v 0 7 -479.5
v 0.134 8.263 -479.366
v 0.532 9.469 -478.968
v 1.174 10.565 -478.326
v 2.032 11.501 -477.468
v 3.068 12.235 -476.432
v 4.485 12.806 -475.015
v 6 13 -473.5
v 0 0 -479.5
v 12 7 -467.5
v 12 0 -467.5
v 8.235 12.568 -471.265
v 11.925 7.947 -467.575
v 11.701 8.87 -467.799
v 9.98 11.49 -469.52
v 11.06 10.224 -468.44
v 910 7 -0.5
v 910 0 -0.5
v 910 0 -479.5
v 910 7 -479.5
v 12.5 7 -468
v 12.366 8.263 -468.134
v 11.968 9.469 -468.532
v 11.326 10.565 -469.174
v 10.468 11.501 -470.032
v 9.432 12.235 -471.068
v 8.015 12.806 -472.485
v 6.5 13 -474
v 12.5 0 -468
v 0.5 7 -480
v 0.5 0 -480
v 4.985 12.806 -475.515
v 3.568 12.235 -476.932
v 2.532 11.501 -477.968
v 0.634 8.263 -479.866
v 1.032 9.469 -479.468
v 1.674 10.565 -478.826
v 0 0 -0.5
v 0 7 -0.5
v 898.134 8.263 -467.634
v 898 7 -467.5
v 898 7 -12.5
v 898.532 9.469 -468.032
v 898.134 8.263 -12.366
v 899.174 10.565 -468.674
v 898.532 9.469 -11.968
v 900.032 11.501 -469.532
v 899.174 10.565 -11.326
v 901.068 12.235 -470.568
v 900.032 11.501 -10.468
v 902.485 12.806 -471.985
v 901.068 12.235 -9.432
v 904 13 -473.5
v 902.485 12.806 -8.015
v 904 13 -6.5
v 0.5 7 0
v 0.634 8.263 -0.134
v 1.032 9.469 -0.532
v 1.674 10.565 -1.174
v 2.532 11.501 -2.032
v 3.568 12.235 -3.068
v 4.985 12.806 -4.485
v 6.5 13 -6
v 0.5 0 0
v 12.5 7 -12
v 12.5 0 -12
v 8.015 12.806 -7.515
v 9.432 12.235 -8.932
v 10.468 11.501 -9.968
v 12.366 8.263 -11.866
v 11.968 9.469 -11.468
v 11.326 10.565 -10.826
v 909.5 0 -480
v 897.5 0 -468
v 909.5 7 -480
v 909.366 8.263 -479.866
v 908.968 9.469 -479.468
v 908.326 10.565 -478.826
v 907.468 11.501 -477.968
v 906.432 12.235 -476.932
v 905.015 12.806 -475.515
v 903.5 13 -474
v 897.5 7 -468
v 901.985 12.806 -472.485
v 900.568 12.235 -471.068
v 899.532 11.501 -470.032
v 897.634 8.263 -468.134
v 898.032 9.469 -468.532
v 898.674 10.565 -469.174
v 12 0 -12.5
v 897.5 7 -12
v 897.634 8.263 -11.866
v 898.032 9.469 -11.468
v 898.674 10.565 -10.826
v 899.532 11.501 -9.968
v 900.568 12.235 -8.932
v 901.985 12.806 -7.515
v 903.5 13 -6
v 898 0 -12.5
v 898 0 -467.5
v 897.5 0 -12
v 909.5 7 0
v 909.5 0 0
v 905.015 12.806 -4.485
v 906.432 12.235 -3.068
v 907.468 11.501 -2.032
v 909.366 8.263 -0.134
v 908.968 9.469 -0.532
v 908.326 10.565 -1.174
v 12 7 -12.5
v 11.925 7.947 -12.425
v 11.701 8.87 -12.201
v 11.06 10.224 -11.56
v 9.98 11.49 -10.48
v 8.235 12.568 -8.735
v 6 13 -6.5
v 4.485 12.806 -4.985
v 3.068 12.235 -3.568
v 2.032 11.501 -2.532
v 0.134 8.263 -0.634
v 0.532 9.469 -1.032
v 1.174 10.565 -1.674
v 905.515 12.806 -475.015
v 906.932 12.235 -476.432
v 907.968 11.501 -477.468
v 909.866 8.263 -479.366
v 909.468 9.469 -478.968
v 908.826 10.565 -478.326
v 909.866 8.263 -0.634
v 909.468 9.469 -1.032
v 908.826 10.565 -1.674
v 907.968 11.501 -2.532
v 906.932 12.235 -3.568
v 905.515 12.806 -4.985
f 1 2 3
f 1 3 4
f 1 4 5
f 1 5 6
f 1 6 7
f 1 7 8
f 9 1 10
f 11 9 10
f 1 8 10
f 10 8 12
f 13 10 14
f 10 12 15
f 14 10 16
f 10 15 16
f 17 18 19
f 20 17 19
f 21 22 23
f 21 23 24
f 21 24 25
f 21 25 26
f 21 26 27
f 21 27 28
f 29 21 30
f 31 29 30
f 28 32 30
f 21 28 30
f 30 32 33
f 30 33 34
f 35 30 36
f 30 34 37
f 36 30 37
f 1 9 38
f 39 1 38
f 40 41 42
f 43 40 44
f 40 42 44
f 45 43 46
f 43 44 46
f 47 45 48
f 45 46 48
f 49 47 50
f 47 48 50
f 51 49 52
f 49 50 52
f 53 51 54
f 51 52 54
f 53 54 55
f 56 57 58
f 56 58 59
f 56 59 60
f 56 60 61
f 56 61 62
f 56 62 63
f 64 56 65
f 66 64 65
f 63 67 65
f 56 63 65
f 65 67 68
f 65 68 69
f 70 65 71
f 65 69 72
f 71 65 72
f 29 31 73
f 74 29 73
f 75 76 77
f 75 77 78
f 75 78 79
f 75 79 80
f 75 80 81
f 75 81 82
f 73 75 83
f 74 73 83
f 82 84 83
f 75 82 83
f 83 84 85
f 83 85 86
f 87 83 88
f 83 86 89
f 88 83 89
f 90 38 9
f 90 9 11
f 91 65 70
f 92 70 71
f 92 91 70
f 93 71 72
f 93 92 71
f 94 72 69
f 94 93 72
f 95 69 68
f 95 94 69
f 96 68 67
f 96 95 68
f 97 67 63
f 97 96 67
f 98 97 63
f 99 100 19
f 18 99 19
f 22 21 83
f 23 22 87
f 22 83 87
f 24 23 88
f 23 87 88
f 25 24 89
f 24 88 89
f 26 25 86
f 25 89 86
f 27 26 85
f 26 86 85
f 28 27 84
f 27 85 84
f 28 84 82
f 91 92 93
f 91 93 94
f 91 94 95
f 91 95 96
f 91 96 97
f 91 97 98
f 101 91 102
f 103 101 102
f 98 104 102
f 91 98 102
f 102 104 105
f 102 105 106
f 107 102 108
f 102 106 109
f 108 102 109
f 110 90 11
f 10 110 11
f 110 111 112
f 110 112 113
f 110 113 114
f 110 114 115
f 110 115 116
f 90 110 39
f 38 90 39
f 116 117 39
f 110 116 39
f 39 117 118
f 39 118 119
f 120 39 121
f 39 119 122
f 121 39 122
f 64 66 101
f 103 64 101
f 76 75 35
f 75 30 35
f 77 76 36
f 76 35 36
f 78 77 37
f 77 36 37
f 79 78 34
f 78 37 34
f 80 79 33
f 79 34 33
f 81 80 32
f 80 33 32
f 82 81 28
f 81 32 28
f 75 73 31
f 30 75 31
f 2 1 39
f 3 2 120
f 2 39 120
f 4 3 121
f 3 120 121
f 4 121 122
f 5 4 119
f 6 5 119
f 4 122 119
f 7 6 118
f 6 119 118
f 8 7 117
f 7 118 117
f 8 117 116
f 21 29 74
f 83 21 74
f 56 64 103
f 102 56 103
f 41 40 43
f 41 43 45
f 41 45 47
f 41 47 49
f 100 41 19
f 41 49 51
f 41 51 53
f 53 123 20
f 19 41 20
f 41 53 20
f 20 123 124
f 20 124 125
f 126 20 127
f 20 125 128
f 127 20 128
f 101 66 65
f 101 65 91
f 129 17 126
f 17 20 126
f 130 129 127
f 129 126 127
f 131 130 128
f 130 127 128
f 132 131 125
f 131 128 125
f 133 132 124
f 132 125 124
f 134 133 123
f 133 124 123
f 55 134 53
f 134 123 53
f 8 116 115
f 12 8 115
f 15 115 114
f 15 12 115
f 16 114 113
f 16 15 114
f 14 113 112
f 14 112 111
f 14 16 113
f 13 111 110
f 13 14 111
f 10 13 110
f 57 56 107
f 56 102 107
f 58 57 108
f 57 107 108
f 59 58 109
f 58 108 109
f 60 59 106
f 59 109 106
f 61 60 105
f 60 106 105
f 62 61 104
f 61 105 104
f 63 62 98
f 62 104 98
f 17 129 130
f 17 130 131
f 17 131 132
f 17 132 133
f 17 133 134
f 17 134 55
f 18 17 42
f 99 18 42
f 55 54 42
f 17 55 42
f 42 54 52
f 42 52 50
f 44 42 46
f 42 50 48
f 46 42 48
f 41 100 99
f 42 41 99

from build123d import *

# Parameters (mm, degrees)
CROQUIS1_W              = 910
CROQUIS1_H              = 12
SALIENTE_EXTRUIR1_DEPTH = 13
CORTAR_EXTRUIR1_DEPTH   = 40
REDONDEO6_R             = 6
REDONDEO7_R             = 6
REDONDEO8_R             = 6
REDONDEO9_R             = 6


with BuildPart() as part:
    # Croquis1 → Saliente-Extruir1 (new body)
    with BuildSketch(Plane(origin=(0, 0, 0), x_dir=(1, 0, 0), z_dir=(0, 1, 0))):
        Polygon((0, 480), (0, 12), (12, 12), (12, 468), (898, 468), (898, 12), (910, 12), (910, 480), align=None)
        with Locations((455, 6)):
            Rectangle(CROQUIS1_W, CROQUIS1_H)
    extrude(amount=SALIENTE_EXTRUIR1_DEPTH)

    # Croquis2 → Cortar-Extruir1 (cut)
    with BuildSketch(Plane(origin=(0, 13, 0), x_dir=(1, 0, 0), z_dir=(0, 1, 0))):
        Polygon((12, 467.5), (12, 468), (0, 480), (0, 479.5), align=None)
        Polygon((0, 480), (12, 468), (12.5, 468), (0.5, 480), align=None)
        Polygon((12, 12), (12, 12.5), (0, 0.5), (0, 0), align=None)
        Polygon((12.5, 12), (12, 12), (0, 0), (0.5, 0), align=None)
        Polygon((910, 480), (898, 468), (898, 467.5), (910, 479.5), align=None)
        Polygon((909.5, 480), (897.5, 468), (898, 468), (910, 480), align=None)
        Polygon((910, 0.5), (898, 12.5), (898, 12), (910, 0), align=None)
        Polygon((898, 12), (897.5, 12), (909.5, 0), (910, 0), align=None)
    extrude(amount=-CORTAR_EXTRUIR1_DEPTH, mode=Mode.SUBTRACT)


with BuildPart() as cortar_extruir1_piece_1:
    # of the separate pieces the step leaves, piece 1, a body of its own (cortar_extruir1_pieces)
    add(part.part.solids().sort_by_distance((909.5, 0, -480))[0])

    # Redondeo6
    redondeo6_edges = [cortar_extruir1_piece_1.edges().sort_by_distance(p)[0] for p in [
        (455, 13, -480),
        (455, 13, -468),
    ]]
    fillet(redondeo6_edges, radius=REDONDEO6_R - 0.0001)  # a hair under: the kernel refuses the full size


with BuildPart() as cortar_extruir1_piece_2:
    # of the separate pieces the step leaves, piece 2, a body of its own (cortar_extruir1_pieces)
    add(part.part.solids().sort_by_distance((0.5, 0, 0))[0])

    # Redondeo8
    redondeo8_edges = [cortar_extruir1_piece_2.edges().sort_by_distance(p)[0] for p in [
        (455, 13, 0),
        (455, 13, -12),
    ]]
    fillet(redondeo8_edges, radius=REDONDEO8_R - 0.0001)  # a hair under: the kernel refuses the full size


with BuildPart() as cortar_extruir1_piece_3:
    # of the separate pieces the step leaves, piece 3, a body of its own (cortar_extruir1_pieces)
    add(part.part.solids().sort_by_distance((0, 0, -479.5))[0])

    # Redondeo7
    redondeo7_edges = [cortar_extruir1_piece_3.edges().sort_by_distance(p)[0] for p in [
        (0, 13, -240),
        (12, 13, -240),
    ]]
    fillet(redondeo7_edges, radius=REDONDEO7_R - 0.0001)  # a hair under: the kernel refuses the full size


with BuildPart() as cortar_extruir1_piece_4:
    # of the separate pieces the step leaves, piece 4, a body of its own (cortar_extruir1_pieces)
    add(part.part.solids().sort_by_distance((910, 0, -479.5))[0])

    # Redondeo9
    redondeo9_edges = [cortar_extruir1_piece_4.edges().sort_by_distance(p)[0] for p in [
        (910, 13, -240),
        (898, 13, -240),
    ]]
    fillet(redondeo9_edges, radius=REDONDEO9_R - 0.0001)  # a hair under: the kernel refuses the full size


solid = Compound([cortar_extruir1_piece_1.part, cortar_extruir1_piece_2.part, cortar_extruir1_piece_3.part, cortar_extruir1_piece_4.part])
